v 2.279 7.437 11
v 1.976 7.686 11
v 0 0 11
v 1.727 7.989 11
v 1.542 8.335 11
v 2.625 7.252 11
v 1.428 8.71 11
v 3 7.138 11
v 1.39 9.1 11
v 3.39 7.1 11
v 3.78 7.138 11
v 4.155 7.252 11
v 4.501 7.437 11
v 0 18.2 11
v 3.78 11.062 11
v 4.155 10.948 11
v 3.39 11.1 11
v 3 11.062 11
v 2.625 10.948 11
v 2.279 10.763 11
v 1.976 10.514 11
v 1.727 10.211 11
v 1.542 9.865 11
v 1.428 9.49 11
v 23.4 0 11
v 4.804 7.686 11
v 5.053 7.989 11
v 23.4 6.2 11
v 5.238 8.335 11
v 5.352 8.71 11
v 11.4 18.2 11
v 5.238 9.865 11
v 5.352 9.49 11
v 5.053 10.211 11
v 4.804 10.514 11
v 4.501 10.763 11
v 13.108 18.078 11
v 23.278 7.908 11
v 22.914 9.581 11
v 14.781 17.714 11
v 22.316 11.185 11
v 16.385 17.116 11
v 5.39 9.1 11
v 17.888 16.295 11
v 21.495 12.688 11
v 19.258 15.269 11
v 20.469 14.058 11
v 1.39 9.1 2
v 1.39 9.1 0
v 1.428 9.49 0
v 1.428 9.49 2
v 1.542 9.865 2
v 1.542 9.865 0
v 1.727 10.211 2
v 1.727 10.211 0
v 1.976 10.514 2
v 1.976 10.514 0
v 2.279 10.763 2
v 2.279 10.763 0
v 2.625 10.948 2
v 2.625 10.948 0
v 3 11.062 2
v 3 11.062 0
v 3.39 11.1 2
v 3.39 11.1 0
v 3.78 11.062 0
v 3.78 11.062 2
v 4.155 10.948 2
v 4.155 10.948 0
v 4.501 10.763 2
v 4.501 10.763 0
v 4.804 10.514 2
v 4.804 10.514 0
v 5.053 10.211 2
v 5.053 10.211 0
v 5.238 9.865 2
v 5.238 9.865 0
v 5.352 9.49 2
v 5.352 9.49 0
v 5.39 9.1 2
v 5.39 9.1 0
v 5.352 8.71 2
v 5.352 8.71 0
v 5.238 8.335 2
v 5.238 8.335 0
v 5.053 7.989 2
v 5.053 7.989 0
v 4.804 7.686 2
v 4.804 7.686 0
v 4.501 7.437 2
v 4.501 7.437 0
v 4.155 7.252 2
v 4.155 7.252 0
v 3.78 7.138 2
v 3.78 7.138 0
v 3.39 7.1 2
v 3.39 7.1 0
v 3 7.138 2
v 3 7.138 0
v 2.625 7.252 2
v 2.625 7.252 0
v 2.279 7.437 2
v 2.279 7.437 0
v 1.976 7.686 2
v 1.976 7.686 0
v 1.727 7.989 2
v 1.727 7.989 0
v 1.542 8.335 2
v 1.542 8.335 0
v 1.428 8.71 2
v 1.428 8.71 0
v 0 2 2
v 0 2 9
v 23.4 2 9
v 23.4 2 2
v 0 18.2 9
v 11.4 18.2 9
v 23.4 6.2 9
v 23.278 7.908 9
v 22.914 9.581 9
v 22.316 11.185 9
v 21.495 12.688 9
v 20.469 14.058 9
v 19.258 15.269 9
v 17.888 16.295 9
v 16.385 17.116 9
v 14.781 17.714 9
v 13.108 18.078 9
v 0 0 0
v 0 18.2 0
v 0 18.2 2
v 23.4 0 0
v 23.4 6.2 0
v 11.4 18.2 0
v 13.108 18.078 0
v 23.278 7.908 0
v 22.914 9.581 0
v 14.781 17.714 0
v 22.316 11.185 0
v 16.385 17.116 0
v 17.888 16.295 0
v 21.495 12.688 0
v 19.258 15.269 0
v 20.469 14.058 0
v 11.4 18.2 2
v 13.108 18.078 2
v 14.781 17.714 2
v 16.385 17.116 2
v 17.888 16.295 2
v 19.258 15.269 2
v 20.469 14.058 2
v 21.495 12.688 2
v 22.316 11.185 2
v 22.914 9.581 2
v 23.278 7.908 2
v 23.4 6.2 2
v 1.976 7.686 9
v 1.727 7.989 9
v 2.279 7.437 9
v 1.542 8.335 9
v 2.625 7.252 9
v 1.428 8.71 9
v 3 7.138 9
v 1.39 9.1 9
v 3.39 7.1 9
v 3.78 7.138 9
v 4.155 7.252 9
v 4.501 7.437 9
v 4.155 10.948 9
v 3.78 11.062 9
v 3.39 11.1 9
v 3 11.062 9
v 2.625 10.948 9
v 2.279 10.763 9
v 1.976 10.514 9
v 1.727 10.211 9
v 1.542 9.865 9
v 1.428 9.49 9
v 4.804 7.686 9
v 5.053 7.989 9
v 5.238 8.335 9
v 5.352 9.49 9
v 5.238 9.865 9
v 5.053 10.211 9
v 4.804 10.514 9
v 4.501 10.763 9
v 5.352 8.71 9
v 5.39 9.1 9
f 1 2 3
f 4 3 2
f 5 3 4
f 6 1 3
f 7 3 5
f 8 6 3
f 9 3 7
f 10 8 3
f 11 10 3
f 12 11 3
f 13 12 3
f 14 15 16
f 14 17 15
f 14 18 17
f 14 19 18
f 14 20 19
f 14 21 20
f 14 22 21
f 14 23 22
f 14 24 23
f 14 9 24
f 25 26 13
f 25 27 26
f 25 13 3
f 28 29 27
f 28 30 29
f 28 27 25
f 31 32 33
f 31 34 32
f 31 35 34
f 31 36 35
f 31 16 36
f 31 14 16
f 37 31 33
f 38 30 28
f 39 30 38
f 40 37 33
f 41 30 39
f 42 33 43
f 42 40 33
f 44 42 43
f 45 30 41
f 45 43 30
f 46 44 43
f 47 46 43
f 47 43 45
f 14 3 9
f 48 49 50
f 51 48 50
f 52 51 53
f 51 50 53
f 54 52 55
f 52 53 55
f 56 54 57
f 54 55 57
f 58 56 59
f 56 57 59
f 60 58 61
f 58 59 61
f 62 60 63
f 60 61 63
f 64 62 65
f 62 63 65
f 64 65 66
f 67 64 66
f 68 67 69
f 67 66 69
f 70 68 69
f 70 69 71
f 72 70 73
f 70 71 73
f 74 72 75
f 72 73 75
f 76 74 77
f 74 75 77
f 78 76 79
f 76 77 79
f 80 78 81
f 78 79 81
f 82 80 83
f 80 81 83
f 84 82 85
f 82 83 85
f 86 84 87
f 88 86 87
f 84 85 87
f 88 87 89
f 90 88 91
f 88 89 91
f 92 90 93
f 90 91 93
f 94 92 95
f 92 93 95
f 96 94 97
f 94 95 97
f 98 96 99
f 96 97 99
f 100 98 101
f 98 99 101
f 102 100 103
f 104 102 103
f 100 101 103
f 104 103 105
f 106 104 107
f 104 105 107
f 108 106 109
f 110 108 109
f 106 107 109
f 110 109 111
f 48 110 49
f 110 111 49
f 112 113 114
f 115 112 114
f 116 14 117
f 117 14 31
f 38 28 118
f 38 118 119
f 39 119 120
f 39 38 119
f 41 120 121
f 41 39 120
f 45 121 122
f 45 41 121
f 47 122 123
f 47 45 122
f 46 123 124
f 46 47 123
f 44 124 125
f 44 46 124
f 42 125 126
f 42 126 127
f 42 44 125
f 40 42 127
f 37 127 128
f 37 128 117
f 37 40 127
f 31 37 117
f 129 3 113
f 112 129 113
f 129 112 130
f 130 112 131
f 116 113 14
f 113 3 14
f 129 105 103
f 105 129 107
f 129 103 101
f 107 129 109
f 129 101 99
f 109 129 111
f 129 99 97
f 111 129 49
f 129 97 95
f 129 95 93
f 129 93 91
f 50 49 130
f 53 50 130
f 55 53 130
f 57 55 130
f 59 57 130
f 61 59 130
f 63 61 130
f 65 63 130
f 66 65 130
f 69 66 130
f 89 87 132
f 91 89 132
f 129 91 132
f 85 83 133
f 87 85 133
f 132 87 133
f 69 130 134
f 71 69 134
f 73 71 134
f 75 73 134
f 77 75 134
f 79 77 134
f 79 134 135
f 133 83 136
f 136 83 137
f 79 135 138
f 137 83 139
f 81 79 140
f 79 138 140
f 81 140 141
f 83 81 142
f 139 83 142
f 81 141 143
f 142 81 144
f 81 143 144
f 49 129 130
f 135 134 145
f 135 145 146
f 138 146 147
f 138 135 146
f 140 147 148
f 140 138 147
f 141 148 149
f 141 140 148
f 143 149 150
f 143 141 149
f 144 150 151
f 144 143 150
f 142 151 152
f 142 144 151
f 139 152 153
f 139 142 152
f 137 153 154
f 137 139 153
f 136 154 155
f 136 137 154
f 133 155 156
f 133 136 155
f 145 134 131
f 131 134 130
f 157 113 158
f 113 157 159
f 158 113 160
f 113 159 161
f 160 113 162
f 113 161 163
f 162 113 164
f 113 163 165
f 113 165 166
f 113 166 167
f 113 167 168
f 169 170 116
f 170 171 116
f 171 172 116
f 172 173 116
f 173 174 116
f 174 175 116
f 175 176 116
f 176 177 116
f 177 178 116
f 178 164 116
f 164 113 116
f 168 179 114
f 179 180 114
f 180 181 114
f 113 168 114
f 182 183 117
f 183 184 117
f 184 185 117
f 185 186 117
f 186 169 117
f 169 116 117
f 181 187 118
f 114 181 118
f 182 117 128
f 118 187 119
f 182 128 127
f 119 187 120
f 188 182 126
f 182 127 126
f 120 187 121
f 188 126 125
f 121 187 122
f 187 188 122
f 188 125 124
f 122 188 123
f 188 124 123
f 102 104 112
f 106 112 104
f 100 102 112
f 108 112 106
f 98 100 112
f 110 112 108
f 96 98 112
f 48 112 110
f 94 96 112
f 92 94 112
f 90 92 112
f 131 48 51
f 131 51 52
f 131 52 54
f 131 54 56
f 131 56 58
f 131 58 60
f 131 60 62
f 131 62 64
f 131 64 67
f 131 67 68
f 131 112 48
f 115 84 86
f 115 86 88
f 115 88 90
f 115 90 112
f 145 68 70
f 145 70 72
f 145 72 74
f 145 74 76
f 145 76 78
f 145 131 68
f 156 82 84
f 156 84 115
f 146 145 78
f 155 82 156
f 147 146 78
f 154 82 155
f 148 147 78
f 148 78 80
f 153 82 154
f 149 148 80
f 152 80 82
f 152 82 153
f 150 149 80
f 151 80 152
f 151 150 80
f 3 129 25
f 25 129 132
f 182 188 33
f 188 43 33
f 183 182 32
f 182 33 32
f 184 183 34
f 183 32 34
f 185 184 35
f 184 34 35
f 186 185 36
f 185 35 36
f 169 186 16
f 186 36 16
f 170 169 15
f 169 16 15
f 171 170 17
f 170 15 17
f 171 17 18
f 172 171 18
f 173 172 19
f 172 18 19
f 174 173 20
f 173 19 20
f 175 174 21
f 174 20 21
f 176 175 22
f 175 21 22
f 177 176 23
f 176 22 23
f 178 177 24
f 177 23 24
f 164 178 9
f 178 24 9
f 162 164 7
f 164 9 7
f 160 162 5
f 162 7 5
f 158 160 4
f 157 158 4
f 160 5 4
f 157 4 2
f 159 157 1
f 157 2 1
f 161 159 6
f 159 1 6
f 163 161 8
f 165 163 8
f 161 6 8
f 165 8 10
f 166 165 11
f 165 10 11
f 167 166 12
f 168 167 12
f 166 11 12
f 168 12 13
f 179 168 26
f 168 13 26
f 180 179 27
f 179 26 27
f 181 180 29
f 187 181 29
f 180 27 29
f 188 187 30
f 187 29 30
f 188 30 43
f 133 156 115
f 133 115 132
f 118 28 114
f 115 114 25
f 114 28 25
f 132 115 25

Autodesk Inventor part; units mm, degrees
ref_plane "YZ Plane" through (0, 0, 0) normal (1, 0, 0) x (0, 1, 0)
ref_plane "XZ Plane" through (0, 0, 0) normal (0, 1, 0) x (-1, 0, 0)
ref_plane "XY Plane" through (0, 0, 0) normal (0, 0, 1) x (1, 0, 0)
sketch "Esquisse1" plane through (0, 0, 0) normal (0, 0, 1) x (1, 0, 0)
  line L0 (0, 0) -> (23.4, 0)
  line L1 (23.4, 0) -> (23.4, 6.2)
  line L2 (11.4, 18.2) -> (0, 18.2)
  line L3 (0, 18.2) -> (0, 0)
  arc A0 (23.4, 6.2) -> (11.4, 18.2) centre (11.4, 6.2) ccw
  dimension "d0" = 18.2
  dimension "d1" = 23.4
  dimension "d2" = 12
extrude "Extrusion1" add sketch "Esquisse1" along normal blind 2
sketch "Esquisse2" plane through (0, 0, 0) normal (0, -1, 0) x (1, 0, 0)
  line L0 (0, 2) -> (23.4, 2) projected
  line L1 (0, 2) -> (23.4, 2)
  line L2 (23.4, 2) -> (23.4, 11)
  line L3 (23.4, 11) -> (0, 11)
  line L4 (0, 11) -> (0, 2)
  point P0 (0, 0)
  dimension "d5" = 9
extrude "Extrusion2" add sketch "Esquisse2" against normal blind 2
sketch "Esquisse3" plane through (0, 0, 11) normal (0, 0, 1) x (1, 0, 0)
  line L0 (0, 2) -> (23.4, 2) projected
  line L1 (23.4, 2) -> (0, 2)
  line L2 (0, 2) -> (0, 18.2)
  line L3 (0, 18.2) -> (11.4, 18.2)
  line L4 (23.4, 6.2) -> (23.4, 2)
  arc A0 (23.4, 6.2) -> (11.4, 18.2) centre (11.4, 6.2) ccw
  point P0 (0, 0)
  dimension "d8" = 16.2
  dimension "d9" = 12
extrude "Extrusion3" add sketch "Esquisse3" against normal blind 2
sketch "Esquisse4" plane through (0, 0, 11) normal (0, 0, 1) x (1, 0, 0)
  circle A0 centre (3.39, 9.1) radius 2
  line L0 (23.4, 0) -> (0, 0) projected
  line L1 (23.4, 0) -> (23.4, 6.2) projected
  line L2 (0, 0) -> (0, 18.2) projected
  dimension "d12" = 9.1
  dimension "d14" = 4
  dimension "d19" = 3.39
extrude "Extrusion4" cut sketch "Esquisse4" against normal blind 2
sketch "Esquisse5" plane through (0, 0, 0) normal (0, 0, -1) x (-1, 0, 0)
  circle A0 centre (-3.39, 9.1) radius 2 projected
  circle A1 centre (-3.39, 9.1) radius 2
  point P0 (0, 0)
extrude "Extrusion5" cut sketch "Esquisse5" against normal blind 2
properties part number "Finger2" material "Plastique ABS"
